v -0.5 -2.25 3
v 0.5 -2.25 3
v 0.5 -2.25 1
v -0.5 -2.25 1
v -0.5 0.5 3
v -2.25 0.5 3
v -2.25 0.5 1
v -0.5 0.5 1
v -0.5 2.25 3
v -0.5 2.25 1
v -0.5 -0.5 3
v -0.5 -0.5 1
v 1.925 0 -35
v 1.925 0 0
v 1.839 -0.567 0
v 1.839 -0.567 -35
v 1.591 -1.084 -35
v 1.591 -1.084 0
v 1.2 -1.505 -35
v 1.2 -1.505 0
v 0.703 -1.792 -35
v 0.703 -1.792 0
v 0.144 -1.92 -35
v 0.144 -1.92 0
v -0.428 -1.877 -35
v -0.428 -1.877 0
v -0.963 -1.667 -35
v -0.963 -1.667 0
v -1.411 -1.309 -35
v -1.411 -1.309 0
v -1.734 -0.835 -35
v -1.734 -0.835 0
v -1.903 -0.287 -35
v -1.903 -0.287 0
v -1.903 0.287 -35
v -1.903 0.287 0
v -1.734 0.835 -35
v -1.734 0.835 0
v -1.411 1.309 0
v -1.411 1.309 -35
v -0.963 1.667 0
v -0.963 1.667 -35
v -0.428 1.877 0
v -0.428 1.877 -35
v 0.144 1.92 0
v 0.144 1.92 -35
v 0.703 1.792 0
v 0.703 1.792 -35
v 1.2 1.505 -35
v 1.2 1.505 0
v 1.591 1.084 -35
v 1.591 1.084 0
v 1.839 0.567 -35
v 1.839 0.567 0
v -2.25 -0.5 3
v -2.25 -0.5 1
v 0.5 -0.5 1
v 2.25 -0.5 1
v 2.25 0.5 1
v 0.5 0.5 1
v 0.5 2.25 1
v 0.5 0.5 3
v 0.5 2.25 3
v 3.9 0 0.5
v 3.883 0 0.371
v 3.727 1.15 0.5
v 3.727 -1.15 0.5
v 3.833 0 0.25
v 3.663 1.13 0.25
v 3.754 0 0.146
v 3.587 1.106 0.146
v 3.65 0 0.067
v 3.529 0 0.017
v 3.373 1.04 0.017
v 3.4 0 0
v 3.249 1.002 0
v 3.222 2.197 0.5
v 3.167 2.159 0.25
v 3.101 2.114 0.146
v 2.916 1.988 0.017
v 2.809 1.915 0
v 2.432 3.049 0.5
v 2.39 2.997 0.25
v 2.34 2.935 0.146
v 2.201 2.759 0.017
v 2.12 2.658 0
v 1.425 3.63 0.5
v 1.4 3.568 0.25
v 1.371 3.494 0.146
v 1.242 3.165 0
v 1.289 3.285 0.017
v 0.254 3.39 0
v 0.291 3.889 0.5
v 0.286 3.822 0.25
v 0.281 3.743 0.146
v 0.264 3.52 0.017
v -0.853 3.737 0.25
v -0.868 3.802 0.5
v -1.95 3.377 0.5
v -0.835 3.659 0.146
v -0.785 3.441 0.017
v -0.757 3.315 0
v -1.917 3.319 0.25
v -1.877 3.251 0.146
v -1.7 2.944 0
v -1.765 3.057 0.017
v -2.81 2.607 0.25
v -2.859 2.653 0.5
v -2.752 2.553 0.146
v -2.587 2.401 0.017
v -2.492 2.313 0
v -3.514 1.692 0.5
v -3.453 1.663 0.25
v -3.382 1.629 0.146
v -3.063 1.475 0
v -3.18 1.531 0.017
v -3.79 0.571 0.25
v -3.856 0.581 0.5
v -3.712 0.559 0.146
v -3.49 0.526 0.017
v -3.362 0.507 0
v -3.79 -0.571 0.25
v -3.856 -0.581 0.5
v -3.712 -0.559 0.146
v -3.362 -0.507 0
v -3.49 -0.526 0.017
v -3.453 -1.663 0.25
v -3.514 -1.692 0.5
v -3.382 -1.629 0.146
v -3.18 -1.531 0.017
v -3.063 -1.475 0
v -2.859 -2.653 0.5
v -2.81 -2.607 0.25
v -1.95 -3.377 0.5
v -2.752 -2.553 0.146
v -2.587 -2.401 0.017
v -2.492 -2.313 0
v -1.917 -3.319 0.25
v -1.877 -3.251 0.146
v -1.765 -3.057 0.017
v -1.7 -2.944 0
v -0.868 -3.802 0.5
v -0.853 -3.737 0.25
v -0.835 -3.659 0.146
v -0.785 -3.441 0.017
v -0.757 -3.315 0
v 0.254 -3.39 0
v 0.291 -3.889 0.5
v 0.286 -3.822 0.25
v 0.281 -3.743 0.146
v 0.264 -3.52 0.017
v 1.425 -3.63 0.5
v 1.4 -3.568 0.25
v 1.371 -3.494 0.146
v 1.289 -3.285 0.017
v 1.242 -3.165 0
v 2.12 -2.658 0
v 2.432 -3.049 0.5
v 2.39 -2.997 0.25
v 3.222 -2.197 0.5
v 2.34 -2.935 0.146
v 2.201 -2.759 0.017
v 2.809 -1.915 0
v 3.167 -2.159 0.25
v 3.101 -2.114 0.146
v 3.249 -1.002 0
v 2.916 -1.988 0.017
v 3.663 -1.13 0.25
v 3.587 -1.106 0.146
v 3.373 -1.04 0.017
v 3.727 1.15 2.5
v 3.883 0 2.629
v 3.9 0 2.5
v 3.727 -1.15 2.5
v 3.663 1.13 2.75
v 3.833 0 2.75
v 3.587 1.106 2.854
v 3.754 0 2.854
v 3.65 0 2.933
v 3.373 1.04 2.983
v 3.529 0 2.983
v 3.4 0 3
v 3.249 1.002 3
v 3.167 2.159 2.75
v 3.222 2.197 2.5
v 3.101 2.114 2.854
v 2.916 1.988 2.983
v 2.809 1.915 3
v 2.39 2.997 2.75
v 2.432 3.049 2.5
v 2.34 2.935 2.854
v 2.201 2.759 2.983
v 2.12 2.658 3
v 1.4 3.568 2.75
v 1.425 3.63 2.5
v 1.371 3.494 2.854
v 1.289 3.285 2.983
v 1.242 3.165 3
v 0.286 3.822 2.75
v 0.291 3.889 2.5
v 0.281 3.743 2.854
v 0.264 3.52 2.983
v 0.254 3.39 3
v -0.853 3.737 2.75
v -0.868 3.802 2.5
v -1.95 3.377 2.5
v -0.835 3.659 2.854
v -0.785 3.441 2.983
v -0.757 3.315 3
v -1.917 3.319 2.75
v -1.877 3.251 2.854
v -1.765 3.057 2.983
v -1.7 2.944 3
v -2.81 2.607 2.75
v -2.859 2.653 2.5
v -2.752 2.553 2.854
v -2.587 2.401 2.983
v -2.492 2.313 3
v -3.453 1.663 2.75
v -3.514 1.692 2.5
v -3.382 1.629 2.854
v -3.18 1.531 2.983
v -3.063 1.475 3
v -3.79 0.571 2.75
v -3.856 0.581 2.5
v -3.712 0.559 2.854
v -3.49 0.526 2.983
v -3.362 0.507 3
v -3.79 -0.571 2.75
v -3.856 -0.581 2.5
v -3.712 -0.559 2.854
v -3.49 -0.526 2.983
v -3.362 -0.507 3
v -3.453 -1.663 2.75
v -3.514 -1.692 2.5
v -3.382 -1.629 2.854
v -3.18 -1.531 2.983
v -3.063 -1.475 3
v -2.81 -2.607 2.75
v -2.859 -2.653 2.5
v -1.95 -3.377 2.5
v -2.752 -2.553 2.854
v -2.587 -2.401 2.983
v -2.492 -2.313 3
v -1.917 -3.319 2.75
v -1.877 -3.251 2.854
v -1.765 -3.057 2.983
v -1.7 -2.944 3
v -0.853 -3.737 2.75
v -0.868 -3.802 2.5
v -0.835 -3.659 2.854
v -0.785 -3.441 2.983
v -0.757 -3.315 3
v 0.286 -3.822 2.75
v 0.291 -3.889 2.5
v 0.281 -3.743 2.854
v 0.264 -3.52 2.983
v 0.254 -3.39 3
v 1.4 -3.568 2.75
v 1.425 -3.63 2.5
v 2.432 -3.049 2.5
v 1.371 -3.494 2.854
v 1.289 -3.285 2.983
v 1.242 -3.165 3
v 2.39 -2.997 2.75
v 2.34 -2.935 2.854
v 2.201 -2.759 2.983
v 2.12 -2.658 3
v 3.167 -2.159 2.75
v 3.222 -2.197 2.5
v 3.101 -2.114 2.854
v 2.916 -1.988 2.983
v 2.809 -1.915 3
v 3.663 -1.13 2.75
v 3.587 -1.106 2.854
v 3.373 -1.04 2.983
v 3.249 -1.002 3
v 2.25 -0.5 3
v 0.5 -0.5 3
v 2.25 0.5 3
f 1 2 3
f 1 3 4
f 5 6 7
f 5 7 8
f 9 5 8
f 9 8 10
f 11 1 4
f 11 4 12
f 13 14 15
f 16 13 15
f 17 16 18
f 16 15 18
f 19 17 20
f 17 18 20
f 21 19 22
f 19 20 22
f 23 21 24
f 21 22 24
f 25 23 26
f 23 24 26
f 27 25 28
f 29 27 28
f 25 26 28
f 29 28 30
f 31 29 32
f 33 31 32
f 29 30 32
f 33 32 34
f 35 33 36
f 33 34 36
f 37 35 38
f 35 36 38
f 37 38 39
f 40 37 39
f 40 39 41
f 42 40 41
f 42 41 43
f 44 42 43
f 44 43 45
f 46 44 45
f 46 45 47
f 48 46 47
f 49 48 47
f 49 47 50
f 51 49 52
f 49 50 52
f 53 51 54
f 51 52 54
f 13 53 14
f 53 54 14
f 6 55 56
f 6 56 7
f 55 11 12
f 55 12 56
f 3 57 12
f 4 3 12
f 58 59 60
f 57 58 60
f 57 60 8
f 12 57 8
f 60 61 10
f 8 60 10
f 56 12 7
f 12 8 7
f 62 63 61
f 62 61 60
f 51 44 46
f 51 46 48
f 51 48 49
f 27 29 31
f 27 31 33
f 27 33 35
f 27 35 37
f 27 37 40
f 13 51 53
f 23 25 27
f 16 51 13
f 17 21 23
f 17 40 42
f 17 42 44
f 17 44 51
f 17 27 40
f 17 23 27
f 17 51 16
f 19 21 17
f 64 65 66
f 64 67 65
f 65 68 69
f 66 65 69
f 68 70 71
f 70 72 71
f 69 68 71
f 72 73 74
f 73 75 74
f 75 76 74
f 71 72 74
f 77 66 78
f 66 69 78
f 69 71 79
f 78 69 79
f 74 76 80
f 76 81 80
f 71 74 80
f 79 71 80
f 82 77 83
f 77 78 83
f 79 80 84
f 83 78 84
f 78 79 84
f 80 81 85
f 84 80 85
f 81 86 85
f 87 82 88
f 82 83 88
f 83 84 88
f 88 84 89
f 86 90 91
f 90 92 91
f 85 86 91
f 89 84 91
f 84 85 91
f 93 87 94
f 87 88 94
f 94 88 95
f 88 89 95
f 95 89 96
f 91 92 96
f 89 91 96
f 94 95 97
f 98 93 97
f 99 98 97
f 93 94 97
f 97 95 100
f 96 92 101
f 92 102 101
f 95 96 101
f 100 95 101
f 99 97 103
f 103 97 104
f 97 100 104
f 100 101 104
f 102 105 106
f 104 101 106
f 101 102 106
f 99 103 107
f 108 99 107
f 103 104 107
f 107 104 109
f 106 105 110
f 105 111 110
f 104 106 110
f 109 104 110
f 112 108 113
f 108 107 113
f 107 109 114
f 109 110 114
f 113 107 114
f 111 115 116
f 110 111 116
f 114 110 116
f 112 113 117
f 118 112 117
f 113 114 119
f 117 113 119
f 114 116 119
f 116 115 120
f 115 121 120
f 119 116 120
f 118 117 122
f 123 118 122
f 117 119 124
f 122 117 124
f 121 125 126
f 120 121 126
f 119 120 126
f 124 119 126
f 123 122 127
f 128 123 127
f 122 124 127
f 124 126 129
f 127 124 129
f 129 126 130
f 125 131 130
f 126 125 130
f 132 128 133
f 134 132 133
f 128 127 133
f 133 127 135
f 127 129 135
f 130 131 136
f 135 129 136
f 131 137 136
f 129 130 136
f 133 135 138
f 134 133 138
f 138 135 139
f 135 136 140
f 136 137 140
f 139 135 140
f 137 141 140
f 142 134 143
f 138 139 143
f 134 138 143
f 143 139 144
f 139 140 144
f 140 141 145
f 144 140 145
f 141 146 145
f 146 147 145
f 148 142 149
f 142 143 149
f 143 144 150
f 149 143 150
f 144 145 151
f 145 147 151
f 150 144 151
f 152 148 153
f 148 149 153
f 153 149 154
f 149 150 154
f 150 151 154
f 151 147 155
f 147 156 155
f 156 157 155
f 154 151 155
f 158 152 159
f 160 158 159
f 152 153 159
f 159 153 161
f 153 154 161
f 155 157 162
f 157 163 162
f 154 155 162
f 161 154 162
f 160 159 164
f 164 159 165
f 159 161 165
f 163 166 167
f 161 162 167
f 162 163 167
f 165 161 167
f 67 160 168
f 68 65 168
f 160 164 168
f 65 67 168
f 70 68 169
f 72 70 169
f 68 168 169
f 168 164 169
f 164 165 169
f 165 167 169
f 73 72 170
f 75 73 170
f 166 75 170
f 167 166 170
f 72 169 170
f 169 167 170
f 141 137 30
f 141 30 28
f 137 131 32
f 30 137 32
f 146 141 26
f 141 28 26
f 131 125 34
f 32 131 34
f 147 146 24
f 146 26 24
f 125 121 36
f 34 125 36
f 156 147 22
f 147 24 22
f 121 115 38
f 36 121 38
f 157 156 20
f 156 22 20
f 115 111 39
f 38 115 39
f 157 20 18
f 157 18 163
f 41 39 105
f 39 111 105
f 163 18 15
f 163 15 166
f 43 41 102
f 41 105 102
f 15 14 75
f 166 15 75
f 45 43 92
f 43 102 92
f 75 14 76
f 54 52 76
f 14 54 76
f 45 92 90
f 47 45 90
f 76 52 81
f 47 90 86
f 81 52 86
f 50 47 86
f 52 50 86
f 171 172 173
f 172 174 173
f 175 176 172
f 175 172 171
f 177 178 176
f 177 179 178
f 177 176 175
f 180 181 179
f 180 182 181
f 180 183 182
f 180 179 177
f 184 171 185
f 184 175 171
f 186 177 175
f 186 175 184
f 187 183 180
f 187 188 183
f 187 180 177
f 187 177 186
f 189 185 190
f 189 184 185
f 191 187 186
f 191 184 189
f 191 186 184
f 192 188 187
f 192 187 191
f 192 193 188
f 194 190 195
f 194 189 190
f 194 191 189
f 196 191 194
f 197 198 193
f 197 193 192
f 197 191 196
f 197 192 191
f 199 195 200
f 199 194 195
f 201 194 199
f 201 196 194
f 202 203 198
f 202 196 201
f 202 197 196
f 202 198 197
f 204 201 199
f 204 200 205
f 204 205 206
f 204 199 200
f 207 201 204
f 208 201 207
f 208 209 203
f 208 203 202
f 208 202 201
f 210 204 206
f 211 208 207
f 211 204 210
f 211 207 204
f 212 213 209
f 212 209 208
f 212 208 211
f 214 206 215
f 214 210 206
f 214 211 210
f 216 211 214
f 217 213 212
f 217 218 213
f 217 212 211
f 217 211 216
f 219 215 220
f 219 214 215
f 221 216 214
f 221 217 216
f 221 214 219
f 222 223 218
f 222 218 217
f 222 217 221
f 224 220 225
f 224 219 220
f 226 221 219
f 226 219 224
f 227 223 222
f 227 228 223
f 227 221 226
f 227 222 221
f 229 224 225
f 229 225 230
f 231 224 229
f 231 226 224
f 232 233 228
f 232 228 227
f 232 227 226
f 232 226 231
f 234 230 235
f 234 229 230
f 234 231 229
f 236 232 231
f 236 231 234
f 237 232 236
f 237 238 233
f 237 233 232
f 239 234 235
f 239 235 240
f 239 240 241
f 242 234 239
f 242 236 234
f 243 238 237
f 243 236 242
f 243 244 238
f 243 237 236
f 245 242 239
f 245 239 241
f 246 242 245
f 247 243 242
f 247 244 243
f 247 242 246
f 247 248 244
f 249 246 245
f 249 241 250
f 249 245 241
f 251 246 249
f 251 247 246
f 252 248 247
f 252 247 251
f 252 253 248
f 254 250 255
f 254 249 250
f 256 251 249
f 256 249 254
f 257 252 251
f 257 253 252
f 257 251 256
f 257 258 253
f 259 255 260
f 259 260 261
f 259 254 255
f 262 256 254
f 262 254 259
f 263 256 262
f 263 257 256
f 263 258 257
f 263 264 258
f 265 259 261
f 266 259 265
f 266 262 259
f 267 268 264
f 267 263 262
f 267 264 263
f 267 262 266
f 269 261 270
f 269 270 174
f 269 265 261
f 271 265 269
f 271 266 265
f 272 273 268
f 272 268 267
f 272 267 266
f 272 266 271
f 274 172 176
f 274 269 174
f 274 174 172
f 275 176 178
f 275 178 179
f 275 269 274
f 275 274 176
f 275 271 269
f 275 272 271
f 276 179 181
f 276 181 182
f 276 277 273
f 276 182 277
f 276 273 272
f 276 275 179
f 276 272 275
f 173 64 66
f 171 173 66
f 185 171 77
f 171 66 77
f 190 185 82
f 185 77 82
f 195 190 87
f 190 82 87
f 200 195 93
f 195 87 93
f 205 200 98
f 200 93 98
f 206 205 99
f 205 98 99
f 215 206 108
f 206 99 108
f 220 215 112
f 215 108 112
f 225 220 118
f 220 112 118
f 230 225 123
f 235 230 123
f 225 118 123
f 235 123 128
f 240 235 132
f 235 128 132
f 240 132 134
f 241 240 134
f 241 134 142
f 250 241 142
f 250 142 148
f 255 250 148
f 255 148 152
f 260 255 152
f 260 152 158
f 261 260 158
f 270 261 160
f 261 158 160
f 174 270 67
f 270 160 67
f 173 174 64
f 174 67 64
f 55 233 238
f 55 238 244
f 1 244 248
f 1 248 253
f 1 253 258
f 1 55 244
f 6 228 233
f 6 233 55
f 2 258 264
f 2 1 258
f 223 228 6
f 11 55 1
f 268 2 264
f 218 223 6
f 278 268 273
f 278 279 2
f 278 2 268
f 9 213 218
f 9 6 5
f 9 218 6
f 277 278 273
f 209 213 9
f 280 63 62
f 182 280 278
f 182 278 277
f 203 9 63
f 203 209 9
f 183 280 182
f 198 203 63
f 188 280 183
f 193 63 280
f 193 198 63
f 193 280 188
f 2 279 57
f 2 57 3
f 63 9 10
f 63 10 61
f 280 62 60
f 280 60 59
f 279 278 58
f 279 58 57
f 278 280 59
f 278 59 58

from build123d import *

# Parameters (mm, degrees)
ESBO_O5_R                = 3.9
RESSALTO_EXTRUS_O2_DEPTH = 3
CORTE_EXTRUS_O3_DEPTH    = 2
FILETE1_R                = 0.5
ESBO_O8_R                = 1.925
RESSALTO_EXTRUS_O3_DEPTH = 35


with BuildPart() as part:
    # Esboço5 → Ressalto-extrusão2 (new body)
    with BuildSketch(Plane.XY):
        Circle(ESBO_O5_R)
    extrude(amount=RESSALTO_EXTRUS_O2_DEPTH)

    # Esboço7 → Corte-extrusão3 (cut)
    with BuildSketch(Plane.XY.offset(3)):
        Polygon((-0.5, -0.5), (-2.25, -0.5), (-2.25, 0.5), (-0.5, 0.5), (-0.5, 2.25), (0.5, 2.25), (0.5, 0.5), (2.25, 0.5), (2.25, -0.5), (0.5, -0.5), (0.5, -2.25), (-0.5, -2.25), align=None)
    extrude(amount=-CORTE_EXTRUS_O3_DEPTH, mode=Mode.SUBTRACT)

    # Filete1
    filete1_edges = [part.edges().sort_by_distance(p)[0] for p in [
        (-3.9, 0, 0),
        (-3.9, 0, 3),
    ]]
    fillet(filete1_edges, radius=FILETE1_R)

    # Esboço8 → Ressalto-extrusão3 (add)
    with BuildSketch(Plane(origin=(0, 0, 0), x_dir=(-1, 0, 0), z_dir=(0, 0, -1))):
        with Locations(Location((0, 0, 0), (0, 0, 180))):
            Circle(ESBO_O8_R)
    extrude(amount=RESSALTO_EXTRUS_O3_DEPTH)


solid = part.part
